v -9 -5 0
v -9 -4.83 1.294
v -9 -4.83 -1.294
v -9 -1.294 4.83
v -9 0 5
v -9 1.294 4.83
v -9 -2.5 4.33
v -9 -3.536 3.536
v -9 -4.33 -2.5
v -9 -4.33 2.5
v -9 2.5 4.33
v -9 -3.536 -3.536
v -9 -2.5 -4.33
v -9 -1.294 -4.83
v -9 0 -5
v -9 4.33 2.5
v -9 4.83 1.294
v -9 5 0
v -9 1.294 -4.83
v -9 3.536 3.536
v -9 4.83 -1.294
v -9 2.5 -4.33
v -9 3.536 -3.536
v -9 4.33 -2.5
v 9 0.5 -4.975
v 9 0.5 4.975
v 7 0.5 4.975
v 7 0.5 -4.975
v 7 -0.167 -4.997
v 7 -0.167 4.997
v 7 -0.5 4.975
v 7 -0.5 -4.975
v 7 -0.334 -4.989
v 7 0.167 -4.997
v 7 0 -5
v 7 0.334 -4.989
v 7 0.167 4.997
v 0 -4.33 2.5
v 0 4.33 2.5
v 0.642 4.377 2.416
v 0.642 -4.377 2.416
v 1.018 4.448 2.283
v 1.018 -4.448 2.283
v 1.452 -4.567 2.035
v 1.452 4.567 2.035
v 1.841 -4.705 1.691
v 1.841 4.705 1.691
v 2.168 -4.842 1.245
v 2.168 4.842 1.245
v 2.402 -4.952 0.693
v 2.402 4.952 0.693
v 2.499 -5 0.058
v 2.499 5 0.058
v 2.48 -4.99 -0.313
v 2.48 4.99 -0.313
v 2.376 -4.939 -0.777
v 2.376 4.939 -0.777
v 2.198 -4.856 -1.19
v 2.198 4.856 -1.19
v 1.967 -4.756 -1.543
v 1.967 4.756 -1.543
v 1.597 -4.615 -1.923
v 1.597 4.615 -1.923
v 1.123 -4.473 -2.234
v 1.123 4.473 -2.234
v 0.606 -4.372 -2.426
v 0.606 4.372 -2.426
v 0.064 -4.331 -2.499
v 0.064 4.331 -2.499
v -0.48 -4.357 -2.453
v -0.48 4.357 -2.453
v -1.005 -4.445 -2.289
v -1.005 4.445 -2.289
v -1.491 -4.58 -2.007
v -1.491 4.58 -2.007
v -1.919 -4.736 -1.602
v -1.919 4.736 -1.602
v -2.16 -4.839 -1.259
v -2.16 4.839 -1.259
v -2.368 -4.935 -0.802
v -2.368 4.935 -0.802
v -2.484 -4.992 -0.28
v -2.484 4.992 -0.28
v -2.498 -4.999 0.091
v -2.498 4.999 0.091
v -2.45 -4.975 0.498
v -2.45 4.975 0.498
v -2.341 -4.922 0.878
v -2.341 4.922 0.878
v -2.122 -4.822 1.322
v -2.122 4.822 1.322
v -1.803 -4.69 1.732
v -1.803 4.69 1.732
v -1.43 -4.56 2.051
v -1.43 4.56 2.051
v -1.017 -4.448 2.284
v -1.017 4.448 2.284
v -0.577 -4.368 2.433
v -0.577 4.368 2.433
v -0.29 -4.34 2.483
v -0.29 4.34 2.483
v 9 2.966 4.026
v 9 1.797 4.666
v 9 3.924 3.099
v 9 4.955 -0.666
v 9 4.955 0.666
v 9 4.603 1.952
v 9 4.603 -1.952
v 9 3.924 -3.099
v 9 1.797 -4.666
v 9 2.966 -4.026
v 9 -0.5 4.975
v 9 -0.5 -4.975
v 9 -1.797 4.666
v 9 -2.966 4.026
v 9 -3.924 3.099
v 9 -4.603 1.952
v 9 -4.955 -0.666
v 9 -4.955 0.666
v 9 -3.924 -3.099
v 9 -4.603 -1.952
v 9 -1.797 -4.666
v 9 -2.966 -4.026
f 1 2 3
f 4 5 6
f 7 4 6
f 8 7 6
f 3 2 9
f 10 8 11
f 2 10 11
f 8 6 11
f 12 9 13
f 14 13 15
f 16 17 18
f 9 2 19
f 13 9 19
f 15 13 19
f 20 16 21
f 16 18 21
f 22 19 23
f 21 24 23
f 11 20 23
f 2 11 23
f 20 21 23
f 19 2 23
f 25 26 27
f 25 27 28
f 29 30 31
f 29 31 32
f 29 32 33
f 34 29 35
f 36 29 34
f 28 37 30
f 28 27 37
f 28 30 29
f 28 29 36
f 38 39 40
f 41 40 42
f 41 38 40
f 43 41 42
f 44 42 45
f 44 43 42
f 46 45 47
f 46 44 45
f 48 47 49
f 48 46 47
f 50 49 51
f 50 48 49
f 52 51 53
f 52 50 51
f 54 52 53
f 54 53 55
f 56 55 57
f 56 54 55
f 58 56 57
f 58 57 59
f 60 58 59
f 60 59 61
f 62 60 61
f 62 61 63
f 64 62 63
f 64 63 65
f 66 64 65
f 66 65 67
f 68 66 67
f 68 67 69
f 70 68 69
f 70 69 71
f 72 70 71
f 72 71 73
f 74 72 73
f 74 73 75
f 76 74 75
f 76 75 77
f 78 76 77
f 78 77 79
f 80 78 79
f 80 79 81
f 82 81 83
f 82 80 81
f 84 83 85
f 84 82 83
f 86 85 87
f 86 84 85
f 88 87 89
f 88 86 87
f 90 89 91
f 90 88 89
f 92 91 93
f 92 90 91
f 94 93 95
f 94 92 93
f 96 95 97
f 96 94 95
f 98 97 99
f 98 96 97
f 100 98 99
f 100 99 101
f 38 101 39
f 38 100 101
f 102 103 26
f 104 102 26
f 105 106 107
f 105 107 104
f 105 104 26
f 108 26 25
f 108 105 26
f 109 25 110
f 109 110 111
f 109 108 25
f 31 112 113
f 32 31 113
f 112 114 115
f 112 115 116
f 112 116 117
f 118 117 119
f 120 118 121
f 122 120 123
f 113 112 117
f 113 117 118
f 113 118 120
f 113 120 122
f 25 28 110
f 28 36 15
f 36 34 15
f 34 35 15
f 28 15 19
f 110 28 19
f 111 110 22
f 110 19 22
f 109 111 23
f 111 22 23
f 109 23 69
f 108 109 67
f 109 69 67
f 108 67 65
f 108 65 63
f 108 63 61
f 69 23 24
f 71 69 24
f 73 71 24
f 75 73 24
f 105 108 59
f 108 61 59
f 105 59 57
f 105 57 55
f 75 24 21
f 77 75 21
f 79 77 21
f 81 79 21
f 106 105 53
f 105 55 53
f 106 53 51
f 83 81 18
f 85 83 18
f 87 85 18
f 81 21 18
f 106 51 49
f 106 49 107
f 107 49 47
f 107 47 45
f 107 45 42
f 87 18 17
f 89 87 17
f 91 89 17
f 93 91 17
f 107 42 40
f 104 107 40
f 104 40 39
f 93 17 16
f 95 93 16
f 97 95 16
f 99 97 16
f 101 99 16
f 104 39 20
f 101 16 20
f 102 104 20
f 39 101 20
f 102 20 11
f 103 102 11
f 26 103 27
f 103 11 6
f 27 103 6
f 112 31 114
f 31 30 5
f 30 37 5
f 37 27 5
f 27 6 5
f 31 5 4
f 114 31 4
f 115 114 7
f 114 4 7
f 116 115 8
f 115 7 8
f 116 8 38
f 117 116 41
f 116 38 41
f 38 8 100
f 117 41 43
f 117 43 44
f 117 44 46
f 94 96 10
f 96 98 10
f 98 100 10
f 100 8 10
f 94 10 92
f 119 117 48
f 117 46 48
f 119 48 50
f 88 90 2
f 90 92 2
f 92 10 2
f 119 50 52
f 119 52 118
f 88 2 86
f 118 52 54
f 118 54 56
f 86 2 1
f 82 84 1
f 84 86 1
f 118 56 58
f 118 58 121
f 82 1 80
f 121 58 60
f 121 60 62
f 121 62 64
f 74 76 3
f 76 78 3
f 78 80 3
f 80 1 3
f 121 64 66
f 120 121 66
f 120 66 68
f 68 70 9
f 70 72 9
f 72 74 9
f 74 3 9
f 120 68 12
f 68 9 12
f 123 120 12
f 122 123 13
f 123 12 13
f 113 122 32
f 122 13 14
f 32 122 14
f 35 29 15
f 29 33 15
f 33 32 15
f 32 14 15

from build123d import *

# Parameters (mm, degrees)
BOSS_EXTRUDE1_DEPTH      = 9
BOSS_EXTRUDE1_DEPTH_BACK = 9
SKETCH1_R                = 5
CUT_EXTRUDE1_DEPTH       = 12.445523142
CUT_EXTRUDE1_DEPTH_BACK  = 12.445523142
SKETCH7_R                = 2.5
SKETCH8_W                = 10.865587176
SKETCH8_H                = 1
CUT_EXTRUDE2_DEPTH       = 2


with BuildPart() as part:
    # Sketch1 → Boss-Extrude1 (new, two sides: drawn at the far end of the back side and taken through both)
    with BuildSketch(Plane(origin=(0, 0, 0), x_dir=(0, 0, -1), z_dir=(1, 0, 0)).offset(-BOSS_EXTRUDE1_DEPTH_BACK)):
        Circle(SKETCH1_R)
    extrude(amount=BOSS_EXTRUDE1_DEPTH + BOSS_EXTRUDE1_DEPTH_BACK)

    # Sketch7 → Cut-Extrude1 (cut, two sides: drawn at the far end of the back side and taken through both)
    with BuildSketch(Plane(origin=(0, 0, 0), x_dir=(1, 0, 0), z_dir=(0, 1, 0)).offset(-CUT_EXTRUDE1_DEPTH_BACK)):
        Circle(SKETCH7_R)
    extrude(amount=CUT_EXTRUDE1_DEPTH + CUT_EXTRUDE1_DEPTH_BACK, mode=Mode.SUBTRACT)

    # Sketch8 → Cut-Extrude2 (cut)
    with BuildSketch(Plane(origin=(9, 0, 0), x_dir=(0, 0, -1), z_dir=(1, 0, 0))):
        Rectangle(SKETCH8_W, SKETCH8_H)
    extrude(amount=-CUT_EXTRUDE2_DEPTH, mode=Mode.SUBTRACT)


solid = part.part
